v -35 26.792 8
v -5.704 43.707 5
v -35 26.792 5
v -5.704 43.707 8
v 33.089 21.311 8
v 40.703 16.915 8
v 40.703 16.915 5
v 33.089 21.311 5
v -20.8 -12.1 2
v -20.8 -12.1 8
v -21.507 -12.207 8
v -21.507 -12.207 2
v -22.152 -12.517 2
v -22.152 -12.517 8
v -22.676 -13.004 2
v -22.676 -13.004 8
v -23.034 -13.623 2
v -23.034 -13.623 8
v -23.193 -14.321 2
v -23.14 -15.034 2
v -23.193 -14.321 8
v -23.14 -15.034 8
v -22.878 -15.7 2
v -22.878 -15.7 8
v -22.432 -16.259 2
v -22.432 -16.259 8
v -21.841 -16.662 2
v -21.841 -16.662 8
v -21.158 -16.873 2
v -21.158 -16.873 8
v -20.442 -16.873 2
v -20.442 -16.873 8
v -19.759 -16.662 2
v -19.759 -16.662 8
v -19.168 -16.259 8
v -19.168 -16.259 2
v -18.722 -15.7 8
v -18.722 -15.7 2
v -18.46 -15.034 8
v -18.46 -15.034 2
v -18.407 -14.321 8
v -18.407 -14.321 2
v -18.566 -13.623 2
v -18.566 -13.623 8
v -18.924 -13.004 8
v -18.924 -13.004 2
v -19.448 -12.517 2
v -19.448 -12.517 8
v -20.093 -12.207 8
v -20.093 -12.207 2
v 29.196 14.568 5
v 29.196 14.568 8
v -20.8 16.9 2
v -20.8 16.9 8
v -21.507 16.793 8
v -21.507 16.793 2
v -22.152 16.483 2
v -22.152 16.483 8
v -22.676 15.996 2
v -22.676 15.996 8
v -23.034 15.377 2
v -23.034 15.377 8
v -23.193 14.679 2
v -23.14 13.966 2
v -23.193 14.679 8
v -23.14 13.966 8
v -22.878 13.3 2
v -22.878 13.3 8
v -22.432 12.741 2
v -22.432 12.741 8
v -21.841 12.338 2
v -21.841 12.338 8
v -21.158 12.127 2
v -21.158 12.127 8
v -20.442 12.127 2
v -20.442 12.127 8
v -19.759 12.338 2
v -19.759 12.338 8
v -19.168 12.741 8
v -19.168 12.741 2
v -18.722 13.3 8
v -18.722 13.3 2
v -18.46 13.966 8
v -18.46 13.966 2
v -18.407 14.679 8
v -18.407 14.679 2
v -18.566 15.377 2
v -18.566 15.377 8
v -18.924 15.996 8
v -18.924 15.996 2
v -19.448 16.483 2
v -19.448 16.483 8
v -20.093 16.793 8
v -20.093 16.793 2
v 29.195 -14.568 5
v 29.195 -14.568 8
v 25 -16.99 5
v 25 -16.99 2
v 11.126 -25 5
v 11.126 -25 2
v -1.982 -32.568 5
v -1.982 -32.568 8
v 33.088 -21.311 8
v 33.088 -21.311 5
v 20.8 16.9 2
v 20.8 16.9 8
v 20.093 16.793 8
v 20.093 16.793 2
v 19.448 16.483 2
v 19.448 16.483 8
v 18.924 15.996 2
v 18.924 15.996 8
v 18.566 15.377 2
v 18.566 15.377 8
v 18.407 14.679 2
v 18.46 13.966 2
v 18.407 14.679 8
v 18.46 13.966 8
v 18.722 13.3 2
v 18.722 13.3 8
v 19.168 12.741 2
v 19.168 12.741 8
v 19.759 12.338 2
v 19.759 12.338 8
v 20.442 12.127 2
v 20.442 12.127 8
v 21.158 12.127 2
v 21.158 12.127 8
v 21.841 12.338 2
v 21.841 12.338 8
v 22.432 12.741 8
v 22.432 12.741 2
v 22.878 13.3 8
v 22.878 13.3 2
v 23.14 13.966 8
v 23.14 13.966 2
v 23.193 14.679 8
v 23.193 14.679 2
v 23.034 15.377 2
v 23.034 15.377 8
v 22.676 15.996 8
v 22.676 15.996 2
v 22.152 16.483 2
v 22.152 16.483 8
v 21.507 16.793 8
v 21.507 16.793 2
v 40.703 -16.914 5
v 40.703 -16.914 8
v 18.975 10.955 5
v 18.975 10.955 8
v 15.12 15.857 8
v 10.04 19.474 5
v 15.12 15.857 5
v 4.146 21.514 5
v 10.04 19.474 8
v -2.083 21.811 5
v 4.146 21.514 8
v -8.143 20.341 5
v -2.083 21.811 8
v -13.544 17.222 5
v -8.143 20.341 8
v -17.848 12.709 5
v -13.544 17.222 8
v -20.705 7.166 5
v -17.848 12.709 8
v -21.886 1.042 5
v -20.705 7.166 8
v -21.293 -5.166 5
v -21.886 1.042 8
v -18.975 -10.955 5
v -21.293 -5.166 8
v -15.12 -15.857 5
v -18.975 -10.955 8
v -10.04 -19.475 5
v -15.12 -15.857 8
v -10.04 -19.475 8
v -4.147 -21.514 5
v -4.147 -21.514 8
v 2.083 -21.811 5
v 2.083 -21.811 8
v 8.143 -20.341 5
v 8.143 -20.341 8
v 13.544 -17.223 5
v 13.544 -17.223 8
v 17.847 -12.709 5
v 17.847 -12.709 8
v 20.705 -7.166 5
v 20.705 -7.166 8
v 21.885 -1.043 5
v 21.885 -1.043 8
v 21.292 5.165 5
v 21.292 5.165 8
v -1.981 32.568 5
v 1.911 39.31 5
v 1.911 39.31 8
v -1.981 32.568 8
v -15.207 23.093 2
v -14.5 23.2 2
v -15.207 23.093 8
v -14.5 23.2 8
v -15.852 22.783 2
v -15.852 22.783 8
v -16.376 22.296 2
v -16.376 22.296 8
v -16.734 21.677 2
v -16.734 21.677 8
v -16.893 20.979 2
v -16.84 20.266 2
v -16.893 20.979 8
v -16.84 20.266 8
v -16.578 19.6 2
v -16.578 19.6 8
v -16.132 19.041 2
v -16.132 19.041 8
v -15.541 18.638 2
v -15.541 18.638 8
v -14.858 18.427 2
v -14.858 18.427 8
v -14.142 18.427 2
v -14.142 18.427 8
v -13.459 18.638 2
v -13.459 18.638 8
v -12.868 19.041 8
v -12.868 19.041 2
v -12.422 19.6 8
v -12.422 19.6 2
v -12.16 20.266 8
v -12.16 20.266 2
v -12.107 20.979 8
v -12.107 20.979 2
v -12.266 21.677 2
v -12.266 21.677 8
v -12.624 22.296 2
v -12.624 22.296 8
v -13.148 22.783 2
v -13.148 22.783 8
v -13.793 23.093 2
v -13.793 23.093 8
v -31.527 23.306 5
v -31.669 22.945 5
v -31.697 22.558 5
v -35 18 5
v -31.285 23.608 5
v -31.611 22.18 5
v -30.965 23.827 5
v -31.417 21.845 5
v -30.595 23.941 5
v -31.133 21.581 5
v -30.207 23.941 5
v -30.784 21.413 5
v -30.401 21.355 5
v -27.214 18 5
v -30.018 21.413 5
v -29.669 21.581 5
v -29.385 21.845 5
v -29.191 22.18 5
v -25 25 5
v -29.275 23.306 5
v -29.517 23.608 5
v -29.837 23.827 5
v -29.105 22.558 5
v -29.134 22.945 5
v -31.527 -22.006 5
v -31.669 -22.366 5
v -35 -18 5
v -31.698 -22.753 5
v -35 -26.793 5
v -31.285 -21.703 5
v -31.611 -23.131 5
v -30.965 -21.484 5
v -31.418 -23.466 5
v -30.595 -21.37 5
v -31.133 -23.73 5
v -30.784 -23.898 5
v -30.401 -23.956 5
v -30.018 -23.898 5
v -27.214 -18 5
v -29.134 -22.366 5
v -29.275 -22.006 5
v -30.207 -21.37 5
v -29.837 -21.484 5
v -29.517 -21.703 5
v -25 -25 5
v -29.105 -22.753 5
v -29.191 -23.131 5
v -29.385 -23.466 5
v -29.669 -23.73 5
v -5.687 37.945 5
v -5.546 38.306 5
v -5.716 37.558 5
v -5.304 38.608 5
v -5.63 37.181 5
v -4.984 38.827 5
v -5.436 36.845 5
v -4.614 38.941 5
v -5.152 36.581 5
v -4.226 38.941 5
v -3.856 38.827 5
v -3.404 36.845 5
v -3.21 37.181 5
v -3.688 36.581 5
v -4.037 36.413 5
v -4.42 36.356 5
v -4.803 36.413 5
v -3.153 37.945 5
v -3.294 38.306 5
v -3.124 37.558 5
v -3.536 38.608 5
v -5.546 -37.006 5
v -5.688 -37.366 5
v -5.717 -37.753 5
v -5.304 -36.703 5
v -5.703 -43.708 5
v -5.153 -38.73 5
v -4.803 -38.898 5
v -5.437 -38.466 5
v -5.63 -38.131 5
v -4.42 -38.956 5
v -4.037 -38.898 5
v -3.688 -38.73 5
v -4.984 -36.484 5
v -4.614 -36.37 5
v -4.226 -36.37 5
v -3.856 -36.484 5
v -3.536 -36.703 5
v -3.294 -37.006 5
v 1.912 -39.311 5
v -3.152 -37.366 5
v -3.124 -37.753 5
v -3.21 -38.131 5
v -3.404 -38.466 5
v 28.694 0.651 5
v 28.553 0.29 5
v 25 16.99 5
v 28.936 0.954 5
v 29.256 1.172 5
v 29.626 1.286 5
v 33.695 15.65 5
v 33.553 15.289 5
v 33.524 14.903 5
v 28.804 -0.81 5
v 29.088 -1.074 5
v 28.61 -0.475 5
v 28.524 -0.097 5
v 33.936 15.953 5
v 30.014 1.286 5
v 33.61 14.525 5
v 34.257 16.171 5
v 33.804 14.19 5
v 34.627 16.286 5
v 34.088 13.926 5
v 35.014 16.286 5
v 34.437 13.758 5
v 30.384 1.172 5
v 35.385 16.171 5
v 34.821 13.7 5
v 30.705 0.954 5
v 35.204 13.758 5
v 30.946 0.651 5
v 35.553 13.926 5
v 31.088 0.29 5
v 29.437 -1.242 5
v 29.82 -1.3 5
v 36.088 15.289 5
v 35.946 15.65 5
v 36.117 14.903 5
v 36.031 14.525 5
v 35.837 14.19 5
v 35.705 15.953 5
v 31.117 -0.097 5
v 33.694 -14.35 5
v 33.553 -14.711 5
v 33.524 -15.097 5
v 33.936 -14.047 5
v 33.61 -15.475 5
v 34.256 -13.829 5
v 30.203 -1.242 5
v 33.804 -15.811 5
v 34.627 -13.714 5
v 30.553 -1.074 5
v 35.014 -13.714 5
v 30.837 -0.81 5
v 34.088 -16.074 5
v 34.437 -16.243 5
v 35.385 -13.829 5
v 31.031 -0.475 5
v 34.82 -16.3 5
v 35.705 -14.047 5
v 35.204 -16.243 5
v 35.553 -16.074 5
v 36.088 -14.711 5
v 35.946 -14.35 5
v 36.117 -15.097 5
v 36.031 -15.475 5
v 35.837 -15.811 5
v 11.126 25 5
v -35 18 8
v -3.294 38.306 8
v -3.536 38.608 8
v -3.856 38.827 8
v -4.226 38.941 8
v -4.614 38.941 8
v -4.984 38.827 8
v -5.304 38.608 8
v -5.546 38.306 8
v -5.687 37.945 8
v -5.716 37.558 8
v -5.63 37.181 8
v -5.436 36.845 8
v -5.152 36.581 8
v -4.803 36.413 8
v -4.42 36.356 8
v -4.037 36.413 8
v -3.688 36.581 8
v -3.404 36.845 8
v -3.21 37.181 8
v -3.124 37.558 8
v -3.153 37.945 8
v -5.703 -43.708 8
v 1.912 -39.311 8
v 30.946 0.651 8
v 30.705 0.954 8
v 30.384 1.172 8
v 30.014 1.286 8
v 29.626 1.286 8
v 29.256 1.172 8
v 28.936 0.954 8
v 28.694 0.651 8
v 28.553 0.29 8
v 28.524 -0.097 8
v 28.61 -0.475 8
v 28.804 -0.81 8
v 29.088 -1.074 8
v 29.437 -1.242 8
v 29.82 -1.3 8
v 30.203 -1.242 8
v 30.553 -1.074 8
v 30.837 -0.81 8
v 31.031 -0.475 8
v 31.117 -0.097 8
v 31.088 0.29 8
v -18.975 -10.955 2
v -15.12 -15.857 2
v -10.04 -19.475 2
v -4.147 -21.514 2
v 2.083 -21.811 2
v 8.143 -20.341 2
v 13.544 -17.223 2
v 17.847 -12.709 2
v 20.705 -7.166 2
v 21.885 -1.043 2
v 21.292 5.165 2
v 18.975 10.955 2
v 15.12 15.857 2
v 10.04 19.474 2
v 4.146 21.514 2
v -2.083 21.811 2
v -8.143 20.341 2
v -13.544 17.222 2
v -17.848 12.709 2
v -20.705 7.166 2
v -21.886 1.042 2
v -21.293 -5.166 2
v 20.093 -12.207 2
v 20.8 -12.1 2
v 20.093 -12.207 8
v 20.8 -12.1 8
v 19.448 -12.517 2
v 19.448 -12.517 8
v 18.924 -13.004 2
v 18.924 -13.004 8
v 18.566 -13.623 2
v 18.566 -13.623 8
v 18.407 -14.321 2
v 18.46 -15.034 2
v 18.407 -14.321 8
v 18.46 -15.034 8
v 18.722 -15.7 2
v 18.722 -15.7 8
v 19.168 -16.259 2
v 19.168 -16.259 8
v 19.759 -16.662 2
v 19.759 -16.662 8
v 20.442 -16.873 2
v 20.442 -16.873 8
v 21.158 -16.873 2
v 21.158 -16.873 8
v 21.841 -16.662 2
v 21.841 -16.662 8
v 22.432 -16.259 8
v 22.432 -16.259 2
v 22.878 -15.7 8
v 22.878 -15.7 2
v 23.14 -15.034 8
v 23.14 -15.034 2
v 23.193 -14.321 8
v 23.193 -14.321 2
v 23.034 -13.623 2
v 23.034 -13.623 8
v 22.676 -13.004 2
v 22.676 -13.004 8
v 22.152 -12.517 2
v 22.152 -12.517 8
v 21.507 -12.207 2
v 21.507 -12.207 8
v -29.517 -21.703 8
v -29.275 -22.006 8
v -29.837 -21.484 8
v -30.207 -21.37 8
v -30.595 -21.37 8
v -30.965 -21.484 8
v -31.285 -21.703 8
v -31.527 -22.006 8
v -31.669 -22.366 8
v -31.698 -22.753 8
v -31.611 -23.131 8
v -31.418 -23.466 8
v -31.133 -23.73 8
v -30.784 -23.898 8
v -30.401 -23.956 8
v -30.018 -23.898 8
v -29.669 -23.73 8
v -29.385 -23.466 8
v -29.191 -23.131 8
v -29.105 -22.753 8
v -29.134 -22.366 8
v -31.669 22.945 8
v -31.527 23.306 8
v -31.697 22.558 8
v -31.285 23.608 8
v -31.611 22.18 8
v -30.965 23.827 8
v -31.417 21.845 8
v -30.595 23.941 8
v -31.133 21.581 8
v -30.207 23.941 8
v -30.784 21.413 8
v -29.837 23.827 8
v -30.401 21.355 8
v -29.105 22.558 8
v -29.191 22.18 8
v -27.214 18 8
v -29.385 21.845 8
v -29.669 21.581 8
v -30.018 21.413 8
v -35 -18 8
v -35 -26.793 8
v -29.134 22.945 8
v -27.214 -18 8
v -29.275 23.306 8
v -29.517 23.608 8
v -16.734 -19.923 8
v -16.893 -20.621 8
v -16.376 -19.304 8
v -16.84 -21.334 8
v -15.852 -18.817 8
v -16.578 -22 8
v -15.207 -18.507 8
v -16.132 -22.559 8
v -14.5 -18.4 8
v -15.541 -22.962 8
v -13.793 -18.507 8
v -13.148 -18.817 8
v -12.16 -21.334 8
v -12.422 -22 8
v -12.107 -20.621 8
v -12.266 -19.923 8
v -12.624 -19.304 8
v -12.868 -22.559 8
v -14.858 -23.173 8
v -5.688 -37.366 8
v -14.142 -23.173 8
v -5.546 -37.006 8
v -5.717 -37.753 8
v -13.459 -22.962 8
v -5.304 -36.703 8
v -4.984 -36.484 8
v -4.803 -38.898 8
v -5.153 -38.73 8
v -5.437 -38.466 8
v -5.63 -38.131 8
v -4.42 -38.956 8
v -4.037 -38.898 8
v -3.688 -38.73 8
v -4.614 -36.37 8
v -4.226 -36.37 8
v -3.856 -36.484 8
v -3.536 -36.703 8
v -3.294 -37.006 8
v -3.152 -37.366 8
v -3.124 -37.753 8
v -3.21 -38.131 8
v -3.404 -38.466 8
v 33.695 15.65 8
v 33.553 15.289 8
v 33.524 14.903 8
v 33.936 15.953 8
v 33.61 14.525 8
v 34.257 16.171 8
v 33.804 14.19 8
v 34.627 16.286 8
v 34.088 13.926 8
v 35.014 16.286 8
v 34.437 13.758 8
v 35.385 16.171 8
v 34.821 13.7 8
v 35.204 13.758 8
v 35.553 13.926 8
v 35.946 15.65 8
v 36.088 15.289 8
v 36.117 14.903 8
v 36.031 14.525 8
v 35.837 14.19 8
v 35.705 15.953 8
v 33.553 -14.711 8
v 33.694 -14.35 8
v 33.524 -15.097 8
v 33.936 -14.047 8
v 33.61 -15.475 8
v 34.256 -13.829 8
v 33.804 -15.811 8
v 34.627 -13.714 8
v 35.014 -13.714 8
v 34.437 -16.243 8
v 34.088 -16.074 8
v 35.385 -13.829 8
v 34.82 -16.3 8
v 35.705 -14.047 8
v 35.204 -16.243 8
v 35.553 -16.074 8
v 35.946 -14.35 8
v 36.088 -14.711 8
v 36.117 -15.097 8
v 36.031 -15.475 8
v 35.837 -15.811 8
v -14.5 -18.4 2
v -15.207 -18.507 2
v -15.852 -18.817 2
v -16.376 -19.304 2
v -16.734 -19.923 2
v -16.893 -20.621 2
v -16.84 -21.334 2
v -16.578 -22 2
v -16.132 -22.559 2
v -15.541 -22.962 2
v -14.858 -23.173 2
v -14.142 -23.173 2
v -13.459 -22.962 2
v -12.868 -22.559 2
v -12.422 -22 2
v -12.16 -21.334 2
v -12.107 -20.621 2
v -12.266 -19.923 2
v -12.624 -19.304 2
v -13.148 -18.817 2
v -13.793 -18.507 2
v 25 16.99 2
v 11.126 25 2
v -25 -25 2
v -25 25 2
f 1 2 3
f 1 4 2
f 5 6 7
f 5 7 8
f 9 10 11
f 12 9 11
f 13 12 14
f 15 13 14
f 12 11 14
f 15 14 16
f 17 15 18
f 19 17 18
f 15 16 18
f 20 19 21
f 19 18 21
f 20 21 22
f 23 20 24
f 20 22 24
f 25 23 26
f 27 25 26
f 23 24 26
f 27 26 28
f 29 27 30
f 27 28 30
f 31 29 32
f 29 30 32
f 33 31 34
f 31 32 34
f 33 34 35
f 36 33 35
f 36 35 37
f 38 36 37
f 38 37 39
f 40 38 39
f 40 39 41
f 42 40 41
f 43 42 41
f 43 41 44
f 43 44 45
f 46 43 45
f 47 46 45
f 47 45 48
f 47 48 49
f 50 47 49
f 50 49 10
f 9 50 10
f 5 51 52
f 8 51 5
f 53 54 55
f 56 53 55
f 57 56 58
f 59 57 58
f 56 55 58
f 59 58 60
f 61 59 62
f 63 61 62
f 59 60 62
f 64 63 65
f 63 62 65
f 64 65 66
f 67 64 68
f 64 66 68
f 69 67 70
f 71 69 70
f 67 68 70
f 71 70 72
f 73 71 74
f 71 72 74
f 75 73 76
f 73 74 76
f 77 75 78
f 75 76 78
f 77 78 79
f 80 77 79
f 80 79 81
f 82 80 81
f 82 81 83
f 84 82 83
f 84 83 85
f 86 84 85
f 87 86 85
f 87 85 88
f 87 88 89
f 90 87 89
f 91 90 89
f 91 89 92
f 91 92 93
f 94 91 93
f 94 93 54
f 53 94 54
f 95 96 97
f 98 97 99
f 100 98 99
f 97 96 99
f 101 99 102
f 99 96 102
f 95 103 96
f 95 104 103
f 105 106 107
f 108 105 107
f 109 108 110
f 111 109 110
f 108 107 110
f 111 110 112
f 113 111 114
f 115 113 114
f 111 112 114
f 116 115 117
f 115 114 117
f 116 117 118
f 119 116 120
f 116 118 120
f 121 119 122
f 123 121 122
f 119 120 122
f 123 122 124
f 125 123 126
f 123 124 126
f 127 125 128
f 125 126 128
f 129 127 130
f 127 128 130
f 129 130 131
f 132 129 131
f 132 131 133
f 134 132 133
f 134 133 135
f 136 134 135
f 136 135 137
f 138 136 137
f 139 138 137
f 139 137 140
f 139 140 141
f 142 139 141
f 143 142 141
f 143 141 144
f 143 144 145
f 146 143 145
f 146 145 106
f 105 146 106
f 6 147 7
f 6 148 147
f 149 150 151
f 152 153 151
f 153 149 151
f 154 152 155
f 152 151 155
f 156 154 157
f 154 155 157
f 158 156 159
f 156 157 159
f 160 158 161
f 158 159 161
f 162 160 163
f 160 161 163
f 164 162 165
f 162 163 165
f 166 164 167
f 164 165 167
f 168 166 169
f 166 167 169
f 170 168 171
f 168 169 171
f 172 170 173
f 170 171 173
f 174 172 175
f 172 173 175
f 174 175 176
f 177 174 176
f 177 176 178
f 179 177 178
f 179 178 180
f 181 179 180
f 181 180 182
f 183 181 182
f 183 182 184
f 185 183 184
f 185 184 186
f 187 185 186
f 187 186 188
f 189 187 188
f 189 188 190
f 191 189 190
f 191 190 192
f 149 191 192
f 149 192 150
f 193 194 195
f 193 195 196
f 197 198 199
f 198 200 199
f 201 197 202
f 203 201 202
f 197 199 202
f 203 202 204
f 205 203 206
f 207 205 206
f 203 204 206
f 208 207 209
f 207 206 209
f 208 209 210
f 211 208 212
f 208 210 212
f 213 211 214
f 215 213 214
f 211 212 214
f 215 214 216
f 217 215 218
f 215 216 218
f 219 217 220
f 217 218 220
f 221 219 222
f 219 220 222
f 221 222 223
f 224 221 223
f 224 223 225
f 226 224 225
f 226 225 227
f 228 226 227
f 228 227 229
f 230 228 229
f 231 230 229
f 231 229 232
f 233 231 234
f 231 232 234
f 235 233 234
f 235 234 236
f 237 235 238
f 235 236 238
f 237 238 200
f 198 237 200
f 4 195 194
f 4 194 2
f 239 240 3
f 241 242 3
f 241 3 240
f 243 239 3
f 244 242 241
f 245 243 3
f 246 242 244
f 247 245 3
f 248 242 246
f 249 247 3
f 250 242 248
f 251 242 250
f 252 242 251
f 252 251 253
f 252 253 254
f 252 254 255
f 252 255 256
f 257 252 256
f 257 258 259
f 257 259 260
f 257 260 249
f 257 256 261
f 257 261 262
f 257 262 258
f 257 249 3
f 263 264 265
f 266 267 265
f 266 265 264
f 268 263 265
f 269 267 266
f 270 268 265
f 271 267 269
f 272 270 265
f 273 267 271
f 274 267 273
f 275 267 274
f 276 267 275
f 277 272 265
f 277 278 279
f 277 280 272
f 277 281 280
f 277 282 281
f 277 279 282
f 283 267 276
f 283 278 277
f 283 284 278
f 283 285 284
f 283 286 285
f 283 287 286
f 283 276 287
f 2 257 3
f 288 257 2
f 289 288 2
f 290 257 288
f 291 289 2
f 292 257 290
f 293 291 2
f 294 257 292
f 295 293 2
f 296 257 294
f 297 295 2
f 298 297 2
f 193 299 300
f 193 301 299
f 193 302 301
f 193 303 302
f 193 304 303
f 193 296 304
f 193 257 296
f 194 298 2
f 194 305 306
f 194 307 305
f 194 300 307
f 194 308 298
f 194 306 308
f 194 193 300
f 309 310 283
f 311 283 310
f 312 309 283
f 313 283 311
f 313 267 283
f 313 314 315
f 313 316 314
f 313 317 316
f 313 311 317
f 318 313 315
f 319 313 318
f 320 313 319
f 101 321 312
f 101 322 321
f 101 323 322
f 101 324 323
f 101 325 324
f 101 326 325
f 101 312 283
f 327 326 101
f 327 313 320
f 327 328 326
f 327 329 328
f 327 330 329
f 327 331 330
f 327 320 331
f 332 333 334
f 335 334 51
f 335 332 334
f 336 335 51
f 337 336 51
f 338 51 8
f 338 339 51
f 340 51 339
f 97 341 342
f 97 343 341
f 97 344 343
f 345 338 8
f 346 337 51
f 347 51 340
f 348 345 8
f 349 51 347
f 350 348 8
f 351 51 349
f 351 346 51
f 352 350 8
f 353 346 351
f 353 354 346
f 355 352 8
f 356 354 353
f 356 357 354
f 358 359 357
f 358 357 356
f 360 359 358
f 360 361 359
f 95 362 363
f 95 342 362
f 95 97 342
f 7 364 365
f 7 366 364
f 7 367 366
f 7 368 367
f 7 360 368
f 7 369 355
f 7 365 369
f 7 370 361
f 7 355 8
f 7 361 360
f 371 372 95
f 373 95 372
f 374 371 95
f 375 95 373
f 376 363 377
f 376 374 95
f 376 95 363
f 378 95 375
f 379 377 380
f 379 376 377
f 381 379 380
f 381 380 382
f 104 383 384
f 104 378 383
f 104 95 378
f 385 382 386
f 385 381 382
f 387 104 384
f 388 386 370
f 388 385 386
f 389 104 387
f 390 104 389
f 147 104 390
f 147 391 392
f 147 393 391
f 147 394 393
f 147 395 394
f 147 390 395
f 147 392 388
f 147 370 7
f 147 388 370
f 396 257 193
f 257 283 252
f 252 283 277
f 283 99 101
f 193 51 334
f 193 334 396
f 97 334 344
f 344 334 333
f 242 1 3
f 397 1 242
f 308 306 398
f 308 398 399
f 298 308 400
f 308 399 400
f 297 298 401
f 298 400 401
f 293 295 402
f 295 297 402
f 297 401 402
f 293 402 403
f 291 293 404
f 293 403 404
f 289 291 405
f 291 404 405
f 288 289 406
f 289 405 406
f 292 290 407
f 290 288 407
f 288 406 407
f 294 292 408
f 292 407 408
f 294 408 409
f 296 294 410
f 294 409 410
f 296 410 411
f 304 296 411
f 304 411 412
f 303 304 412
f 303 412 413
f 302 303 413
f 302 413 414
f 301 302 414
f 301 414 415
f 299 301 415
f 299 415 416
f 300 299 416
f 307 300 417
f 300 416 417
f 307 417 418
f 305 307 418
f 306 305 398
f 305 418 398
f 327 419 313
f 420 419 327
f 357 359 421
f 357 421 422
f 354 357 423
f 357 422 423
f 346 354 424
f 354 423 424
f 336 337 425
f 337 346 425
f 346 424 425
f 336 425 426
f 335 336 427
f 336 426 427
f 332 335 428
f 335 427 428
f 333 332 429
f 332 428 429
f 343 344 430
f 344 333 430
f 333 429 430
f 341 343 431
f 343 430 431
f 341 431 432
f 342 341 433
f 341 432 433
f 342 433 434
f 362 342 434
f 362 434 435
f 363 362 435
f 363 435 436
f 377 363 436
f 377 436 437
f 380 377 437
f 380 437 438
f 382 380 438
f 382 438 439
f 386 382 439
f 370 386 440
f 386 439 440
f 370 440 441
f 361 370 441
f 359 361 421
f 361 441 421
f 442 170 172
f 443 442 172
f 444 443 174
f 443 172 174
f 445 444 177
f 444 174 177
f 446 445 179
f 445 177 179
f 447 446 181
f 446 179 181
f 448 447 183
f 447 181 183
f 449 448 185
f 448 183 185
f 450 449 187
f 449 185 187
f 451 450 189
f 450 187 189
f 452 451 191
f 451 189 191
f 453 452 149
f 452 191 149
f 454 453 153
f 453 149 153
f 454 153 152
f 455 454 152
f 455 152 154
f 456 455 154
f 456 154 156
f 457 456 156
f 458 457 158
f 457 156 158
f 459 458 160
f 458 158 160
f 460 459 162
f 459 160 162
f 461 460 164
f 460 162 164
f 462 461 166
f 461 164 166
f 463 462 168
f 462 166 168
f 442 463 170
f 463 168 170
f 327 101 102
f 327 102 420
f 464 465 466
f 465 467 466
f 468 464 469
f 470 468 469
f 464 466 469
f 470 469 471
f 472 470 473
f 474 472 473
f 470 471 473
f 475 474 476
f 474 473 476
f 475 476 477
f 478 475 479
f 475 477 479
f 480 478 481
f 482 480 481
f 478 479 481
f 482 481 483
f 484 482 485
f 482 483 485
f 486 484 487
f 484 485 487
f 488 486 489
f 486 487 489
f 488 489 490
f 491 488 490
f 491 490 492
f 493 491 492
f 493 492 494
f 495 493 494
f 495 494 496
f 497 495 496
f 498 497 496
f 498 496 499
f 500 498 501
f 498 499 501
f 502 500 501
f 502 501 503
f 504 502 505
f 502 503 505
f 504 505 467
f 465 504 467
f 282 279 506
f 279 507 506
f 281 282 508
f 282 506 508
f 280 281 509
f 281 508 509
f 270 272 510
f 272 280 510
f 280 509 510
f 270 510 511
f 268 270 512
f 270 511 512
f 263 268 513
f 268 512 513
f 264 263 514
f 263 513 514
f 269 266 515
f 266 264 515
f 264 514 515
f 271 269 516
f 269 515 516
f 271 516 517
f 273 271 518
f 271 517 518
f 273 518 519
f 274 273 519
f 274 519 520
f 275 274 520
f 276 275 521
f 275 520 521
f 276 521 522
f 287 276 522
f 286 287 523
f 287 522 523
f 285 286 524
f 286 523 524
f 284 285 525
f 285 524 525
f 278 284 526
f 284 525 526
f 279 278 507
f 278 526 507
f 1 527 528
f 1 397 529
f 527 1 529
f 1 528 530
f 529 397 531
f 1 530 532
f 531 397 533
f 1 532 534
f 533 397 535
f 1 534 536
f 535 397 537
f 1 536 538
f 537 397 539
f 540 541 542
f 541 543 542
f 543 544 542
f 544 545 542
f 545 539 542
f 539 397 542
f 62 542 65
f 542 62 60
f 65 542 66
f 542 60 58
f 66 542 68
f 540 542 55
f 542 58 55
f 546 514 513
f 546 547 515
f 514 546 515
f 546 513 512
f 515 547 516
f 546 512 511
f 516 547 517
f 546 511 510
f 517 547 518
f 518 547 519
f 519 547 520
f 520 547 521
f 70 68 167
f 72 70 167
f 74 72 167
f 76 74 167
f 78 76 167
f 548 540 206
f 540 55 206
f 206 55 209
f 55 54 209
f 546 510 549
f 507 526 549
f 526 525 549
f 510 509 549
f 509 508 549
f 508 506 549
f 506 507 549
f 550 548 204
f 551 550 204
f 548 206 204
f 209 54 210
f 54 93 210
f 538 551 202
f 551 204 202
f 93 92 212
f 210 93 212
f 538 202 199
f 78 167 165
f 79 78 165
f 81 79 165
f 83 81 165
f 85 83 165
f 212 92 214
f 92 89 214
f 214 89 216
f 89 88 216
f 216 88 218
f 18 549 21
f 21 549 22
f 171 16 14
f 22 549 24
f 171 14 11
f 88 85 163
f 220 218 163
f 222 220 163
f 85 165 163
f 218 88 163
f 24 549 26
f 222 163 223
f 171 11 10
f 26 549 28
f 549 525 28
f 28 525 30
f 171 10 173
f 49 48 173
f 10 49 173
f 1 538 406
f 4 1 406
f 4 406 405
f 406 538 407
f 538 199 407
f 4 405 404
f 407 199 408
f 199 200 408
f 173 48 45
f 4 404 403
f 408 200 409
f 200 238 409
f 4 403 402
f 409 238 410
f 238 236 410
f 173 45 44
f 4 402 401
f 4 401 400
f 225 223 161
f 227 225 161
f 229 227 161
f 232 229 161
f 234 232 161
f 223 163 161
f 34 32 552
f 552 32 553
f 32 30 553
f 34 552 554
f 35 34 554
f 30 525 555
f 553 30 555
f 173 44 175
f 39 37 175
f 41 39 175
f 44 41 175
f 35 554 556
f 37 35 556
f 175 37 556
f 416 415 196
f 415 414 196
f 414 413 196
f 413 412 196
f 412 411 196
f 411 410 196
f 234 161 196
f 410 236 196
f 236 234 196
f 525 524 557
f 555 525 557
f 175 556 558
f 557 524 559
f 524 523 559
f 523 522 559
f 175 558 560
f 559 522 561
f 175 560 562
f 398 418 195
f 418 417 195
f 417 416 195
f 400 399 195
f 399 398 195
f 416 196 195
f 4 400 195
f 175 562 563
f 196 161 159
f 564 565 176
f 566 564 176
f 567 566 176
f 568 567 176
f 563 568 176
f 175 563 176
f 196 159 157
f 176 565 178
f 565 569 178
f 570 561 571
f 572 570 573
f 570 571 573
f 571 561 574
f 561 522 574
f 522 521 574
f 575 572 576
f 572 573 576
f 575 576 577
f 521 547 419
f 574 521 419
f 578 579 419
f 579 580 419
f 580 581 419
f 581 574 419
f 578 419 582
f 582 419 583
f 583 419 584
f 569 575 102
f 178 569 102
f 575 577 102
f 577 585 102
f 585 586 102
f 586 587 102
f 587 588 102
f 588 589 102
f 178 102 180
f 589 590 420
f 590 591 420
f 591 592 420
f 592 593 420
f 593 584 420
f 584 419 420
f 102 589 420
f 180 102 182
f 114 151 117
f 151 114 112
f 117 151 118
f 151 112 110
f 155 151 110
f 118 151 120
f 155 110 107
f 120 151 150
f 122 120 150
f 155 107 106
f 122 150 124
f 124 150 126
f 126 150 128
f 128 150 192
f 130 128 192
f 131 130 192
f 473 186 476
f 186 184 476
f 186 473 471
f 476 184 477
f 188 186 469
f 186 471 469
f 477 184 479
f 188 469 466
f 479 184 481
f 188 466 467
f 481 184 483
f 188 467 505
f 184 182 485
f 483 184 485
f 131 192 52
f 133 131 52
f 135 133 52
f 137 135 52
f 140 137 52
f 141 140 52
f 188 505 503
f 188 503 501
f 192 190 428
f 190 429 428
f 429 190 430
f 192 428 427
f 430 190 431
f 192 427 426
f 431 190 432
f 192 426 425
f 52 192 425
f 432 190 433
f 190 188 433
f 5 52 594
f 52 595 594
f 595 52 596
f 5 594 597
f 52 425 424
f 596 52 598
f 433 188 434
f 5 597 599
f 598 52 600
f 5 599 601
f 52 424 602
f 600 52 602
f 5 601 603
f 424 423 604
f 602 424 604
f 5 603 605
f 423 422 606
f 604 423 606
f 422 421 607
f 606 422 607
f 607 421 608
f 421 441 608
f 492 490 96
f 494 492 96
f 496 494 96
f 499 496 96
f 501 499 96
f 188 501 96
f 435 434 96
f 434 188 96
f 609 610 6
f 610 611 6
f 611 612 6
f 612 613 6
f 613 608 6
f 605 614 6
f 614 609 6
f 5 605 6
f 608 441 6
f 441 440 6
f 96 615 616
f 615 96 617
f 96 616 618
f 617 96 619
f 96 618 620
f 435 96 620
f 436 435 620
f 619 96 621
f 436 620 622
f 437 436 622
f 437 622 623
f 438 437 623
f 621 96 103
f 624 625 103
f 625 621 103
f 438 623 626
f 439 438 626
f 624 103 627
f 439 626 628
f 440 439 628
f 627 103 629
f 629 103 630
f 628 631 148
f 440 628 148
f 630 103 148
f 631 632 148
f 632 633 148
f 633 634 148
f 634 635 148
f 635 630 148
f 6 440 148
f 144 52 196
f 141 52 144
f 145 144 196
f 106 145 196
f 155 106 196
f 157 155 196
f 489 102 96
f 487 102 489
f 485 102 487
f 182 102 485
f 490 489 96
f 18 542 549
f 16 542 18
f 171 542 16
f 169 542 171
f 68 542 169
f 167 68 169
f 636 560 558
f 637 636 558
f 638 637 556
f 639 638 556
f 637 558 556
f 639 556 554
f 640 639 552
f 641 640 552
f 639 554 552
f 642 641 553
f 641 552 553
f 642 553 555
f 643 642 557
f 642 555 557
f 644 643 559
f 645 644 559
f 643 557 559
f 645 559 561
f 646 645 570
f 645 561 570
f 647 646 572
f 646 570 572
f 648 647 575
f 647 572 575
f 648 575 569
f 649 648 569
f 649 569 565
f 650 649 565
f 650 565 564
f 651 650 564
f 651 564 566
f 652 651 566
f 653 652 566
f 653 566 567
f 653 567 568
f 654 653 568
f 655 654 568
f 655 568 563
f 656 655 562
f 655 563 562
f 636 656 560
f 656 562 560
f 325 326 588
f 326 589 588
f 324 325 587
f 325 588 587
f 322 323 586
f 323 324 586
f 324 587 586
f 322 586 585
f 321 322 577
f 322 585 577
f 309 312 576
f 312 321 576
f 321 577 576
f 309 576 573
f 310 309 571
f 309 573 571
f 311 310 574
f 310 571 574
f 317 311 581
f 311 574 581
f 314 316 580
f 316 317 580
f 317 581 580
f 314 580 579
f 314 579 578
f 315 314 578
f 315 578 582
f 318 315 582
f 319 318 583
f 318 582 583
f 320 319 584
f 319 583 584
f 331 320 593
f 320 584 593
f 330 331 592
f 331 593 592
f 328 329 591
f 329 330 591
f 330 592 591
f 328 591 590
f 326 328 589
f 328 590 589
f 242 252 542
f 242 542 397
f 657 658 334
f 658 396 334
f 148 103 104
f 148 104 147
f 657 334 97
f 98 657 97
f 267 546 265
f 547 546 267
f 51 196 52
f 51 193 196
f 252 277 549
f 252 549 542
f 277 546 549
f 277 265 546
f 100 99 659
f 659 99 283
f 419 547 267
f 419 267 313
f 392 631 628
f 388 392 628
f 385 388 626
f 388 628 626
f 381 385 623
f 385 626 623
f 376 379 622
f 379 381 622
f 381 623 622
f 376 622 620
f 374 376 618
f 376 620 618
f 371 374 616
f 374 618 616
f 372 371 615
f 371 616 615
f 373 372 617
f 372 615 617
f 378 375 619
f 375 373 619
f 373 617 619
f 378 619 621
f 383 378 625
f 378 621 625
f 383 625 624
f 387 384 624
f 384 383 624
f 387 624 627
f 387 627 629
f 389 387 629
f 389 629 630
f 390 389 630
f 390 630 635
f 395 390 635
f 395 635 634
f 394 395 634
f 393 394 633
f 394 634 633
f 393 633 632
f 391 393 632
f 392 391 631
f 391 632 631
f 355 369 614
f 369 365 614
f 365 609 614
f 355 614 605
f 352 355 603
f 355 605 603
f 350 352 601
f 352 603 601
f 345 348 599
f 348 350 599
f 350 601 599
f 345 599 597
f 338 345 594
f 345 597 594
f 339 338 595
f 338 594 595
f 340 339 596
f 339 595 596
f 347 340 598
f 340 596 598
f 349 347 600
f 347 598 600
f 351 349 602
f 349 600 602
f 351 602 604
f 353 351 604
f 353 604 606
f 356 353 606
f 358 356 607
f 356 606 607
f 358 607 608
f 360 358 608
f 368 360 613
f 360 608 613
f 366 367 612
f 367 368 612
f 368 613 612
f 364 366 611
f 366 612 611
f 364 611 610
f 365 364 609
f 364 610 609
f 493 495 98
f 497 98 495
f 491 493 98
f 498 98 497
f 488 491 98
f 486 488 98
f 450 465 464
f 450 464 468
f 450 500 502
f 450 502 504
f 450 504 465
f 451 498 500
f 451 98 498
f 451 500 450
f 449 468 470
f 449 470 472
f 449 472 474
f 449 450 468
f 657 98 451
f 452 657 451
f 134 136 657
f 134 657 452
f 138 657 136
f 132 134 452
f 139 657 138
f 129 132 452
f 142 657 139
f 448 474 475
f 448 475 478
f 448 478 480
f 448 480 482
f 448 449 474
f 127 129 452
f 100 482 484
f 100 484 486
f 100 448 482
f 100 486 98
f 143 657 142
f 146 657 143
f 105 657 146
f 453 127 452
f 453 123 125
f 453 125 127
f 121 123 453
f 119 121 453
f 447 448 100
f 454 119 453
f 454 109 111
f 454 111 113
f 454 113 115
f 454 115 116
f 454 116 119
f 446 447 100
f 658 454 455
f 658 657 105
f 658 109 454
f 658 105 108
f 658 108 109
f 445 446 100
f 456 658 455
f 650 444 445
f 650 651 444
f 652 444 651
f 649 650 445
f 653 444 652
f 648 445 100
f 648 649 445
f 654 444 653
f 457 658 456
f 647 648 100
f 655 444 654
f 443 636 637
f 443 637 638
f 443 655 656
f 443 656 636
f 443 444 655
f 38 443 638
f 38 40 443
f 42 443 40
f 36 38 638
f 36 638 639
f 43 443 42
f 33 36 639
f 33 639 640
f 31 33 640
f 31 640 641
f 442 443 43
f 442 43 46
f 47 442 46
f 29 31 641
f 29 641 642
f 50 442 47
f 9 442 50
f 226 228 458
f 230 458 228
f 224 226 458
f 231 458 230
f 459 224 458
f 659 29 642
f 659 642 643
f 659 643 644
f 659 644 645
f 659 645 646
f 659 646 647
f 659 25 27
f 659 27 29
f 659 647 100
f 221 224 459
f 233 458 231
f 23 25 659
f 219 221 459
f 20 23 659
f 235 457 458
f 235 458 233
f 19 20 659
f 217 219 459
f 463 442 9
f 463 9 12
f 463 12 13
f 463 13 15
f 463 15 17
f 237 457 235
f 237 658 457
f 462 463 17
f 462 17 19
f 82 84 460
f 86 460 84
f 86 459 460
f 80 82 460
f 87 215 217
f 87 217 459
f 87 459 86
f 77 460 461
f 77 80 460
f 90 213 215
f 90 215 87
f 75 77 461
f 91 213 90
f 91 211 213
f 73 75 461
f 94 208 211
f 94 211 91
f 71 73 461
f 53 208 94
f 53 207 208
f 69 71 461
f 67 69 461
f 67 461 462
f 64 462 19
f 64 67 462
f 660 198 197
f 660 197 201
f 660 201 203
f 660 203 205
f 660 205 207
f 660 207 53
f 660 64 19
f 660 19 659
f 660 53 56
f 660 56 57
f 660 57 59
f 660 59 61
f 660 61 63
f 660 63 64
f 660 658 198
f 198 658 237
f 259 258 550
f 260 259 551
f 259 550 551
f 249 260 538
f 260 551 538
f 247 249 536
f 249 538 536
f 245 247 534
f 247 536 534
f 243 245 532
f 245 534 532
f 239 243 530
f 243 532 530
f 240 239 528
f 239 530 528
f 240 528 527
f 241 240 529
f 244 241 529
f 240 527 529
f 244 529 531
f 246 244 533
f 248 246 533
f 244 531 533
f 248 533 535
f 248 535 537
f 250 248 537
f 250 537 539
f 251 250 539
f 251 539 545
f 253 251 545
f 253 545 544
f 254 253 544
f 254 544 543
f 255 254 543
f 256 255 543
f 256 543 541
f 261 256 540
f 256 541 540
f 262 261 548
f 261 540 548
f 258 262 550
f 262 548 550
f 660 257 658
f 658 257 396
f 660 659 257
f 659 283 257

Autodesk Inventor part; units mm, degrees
ref_plane "YZ Plane" through (0, 0, 0) normal (1, 0, 0) x (0, 1, 0)
ref_plane "XZ Plane" through (0, 0, 0) normal (0, 1, 0) x (-1, 0, 0)
ref_plane "XY Plane" through (0, 0, 0) normal (0, 0, 1) x (1, 0, 0)
ref_plane "Work Plane4" through (23.7495, -12.4998, 8) normal (0, 0, -1) x (0.866, 0.5, 0)
sketch "Sketch9" plane through (23.7495, -12.4998, 8) normal (0, 0, -1) x (0.866, 0.5, 0)
  circle A0 centre (-36.9735, 7.7008) radius 1.3002
  circle A1 centre (8.3375, 7.7008) radius 1.3002
  circle A2 centre (23.3378, -18.28) radius 1.3
  circle A3 centre (-14.318, -22.6998) radius 21.9102
  circle A4 centre (-51.9737, -18.28) radius 1.3001
  line L0 (-27.63, -57.387) -> (-29.04, -59.377)
  circle A5 centre (-29.3181, -57.5206) radius 1.3001
  circle A6 centre (0.6822, -57.5205) radius 1.3
  circle A7 centre (11.5075, -7.7902) radius 1.3002
  line L1 (-33.586, -63.403) -> (4.877, -63.403) construction
  line L2 (-39.9342, 14.3381) -> (-59.166, -18.972) construction
  line L3 (30.566, -19.035) -> (11.3349, 14.275) construction
  line L4 (-14.3189, -92.6998) -> (-74.9393, 12.301) construction
  line L5 (-74.9393, 12.301) -> (46.3042, 12.2995) construction
  line L6 (46.3042, 12.2995) -> (-14.3189, -92.6998) construction
  line L7 (41.198, -34.545) -> (23.698, -64.855) construction
  line L8 (2.5961, -63.403) -> (-31.2329, -63.403)
  line L9 (-31.2329, -63.403) -> (-58.0252, -16.9961)
  line L10 (-58.0252, -16.9961) -> (-41.1106, 12.3006)
  line L11 (-41.1106, 12.3006) -> (12.4752, 12.2999)
  line L12 (12.4752, 12.2999) -> (29.3894, -16.997)
  line L13 (29.3894, -16.997) -> (2.5961, -63.403)
  point P0 (-14.318, -22.6998)
  dimension "d56" = 35
extrude "Extrusion4" add sketch "Sketch9" along normal blind 3
sketch "Sketch10" plane through (23.7495, -12.4998, 5) normal (0, 0, -1) x (-0.866, -0.5, 0)
  circle A0 centre (14.318, 22.6998) radius 21.9102 projected
  circle A1 centre (36.9735, -7.7008) radius 1.3002 projected
  circle A2 centre (-8.3375, -7.7008) radius 1.3002 projected
  circle A3 centre (-11.5075, 7.7902) radius 1.3002 projected
  circle A4 centre (29.3181, 57.5206) radius 1.3001 projected
  circle A5 centre (51.9737, 18.28) radius 1.3001 projected
  circle A6 centre (-23.3378, 18.28) radius 1.3 projected
  circle A7 centre (-0.6822, 57.5205) radius 1.3 projected
  line L0 (31.2329, 63.403) -> (-2.5961, 63.403) projected
  line L1 (-2.5961, 63.403) -> (-29.3894, 16.997) projected
  line L2 (-29.3894, 16.997) -> (-12.4752, -12.2999) projected
  line L3 (-12.4752, -12.2999) -> (41.1106, -12.3006) projected
  line L4 (41.1106, -12.3006) -> (58.0252, 16.9961) projected
  line L5 (58.0252, 16.9961) -> (31.2329, 63.403) projected
  line L6 (32.318, -14.6138) -> (-3.682, -14.6138)
  line L7 (-3.682, -14.6138) -> (-3.682, -4.5139)
  line L8 (-3.682, -4.5139) -> (32.318, -4.5139)
  line L9 (32.318, -4.5139) -> (32.318, -14.6138)
  point P0 (14.318, 22.6998)
  dimension "d59" = 18
  dimension "d60" = 18
extrude "Extrusion5" cut sketch "Sketch10" against normal through all contours L9 L6 L7 L3 | L3 L7 L8 L9
pattern_circular "Circular Pattern1" count 3 over 360 about axis through (0, 0, 8) along (0, 0, -1) of "Extrusion5"
sketch "Sketch11" plane through (23.7495, -12.4998, 5) normal (0, 0, -1) x (-0.866, -0.5, 0)
  line L0 (23.469, 56.8503) -> (-7.8173, 38.7876)
  line L1 (-15.8275, 24.9136) -> (5.167, -11.4508)
  line L2 (5.167, -11.4508) -> (48.4685, 13.5488)
  line L3 (48.4685, 13.5488) -> (23.469, 56.8503)
  line L4 (23.469, 56.8503) -> (5.167, -11.4508) construction
  line L5 (-19.8325, 31.8507) -> (48.4685, 13.5488) construction
  line L6 (-2.59, 41.8055) -> (-7.8173, 38.7876)
  circle A0 centre (14.318, 22.6998) radius 21.9102 projected
  line L7 (-0.2497, 51.8951) -> (-18.2497, 20.7181) projected
  line L8 (-3.682, -4.5139) -> (32.318, -4.5139) projected
  point P0 (14.318, 22.6998)
  point P1 (1.1621, -4.5139)
  point P2 (17.1824, -4.5139)
  dimension "d66" = 50
  dimension "d67" = 50
extrude "Extrusion6" add sketch "Sketch11" along normal blind 3 contours L3 L2 L8 L1 L7 L0
sketch "Sketch12" plane through (23.7495, -12.4998, 2) normal (0, 0, -1) x (-0.866, -0.5, 0)
  circle A0 centre (37.2753, 11.9362) radius 2.65
  circle A1 centre (39.5813, 20.5422) radius 2.65
  circle A2 centre (25.0816, 45.657) radius 2.65
  circle A3 centre (16.4756, 47.9631) radius 2.65
  circle A4 centre (-10.9453, 24.8574) radius 2.65
  circle A5 centre (3.5544, -0.2575) radius 2.65
  circle A6 centre (12.1604, -2.5635) radius 2.65
  circle A7 centre (-8.6393, 33.4633) radius 2.65
  point P0 (14.318, 22.6998)
hole "Hole4" at (-20.8, -14.5, 2) at (-14.5, -20.8, 2) at (20.8, -14.5, 2) at (20.8, 14.5, 2) at (-14.5, 20.8, 2) at (-20.8, 14.5, 2) direction (0, 0, 1) diameter 4.8 end through all
properties part number "20_Cube_Insert_Openflexure_Deltastage_Adapter"
